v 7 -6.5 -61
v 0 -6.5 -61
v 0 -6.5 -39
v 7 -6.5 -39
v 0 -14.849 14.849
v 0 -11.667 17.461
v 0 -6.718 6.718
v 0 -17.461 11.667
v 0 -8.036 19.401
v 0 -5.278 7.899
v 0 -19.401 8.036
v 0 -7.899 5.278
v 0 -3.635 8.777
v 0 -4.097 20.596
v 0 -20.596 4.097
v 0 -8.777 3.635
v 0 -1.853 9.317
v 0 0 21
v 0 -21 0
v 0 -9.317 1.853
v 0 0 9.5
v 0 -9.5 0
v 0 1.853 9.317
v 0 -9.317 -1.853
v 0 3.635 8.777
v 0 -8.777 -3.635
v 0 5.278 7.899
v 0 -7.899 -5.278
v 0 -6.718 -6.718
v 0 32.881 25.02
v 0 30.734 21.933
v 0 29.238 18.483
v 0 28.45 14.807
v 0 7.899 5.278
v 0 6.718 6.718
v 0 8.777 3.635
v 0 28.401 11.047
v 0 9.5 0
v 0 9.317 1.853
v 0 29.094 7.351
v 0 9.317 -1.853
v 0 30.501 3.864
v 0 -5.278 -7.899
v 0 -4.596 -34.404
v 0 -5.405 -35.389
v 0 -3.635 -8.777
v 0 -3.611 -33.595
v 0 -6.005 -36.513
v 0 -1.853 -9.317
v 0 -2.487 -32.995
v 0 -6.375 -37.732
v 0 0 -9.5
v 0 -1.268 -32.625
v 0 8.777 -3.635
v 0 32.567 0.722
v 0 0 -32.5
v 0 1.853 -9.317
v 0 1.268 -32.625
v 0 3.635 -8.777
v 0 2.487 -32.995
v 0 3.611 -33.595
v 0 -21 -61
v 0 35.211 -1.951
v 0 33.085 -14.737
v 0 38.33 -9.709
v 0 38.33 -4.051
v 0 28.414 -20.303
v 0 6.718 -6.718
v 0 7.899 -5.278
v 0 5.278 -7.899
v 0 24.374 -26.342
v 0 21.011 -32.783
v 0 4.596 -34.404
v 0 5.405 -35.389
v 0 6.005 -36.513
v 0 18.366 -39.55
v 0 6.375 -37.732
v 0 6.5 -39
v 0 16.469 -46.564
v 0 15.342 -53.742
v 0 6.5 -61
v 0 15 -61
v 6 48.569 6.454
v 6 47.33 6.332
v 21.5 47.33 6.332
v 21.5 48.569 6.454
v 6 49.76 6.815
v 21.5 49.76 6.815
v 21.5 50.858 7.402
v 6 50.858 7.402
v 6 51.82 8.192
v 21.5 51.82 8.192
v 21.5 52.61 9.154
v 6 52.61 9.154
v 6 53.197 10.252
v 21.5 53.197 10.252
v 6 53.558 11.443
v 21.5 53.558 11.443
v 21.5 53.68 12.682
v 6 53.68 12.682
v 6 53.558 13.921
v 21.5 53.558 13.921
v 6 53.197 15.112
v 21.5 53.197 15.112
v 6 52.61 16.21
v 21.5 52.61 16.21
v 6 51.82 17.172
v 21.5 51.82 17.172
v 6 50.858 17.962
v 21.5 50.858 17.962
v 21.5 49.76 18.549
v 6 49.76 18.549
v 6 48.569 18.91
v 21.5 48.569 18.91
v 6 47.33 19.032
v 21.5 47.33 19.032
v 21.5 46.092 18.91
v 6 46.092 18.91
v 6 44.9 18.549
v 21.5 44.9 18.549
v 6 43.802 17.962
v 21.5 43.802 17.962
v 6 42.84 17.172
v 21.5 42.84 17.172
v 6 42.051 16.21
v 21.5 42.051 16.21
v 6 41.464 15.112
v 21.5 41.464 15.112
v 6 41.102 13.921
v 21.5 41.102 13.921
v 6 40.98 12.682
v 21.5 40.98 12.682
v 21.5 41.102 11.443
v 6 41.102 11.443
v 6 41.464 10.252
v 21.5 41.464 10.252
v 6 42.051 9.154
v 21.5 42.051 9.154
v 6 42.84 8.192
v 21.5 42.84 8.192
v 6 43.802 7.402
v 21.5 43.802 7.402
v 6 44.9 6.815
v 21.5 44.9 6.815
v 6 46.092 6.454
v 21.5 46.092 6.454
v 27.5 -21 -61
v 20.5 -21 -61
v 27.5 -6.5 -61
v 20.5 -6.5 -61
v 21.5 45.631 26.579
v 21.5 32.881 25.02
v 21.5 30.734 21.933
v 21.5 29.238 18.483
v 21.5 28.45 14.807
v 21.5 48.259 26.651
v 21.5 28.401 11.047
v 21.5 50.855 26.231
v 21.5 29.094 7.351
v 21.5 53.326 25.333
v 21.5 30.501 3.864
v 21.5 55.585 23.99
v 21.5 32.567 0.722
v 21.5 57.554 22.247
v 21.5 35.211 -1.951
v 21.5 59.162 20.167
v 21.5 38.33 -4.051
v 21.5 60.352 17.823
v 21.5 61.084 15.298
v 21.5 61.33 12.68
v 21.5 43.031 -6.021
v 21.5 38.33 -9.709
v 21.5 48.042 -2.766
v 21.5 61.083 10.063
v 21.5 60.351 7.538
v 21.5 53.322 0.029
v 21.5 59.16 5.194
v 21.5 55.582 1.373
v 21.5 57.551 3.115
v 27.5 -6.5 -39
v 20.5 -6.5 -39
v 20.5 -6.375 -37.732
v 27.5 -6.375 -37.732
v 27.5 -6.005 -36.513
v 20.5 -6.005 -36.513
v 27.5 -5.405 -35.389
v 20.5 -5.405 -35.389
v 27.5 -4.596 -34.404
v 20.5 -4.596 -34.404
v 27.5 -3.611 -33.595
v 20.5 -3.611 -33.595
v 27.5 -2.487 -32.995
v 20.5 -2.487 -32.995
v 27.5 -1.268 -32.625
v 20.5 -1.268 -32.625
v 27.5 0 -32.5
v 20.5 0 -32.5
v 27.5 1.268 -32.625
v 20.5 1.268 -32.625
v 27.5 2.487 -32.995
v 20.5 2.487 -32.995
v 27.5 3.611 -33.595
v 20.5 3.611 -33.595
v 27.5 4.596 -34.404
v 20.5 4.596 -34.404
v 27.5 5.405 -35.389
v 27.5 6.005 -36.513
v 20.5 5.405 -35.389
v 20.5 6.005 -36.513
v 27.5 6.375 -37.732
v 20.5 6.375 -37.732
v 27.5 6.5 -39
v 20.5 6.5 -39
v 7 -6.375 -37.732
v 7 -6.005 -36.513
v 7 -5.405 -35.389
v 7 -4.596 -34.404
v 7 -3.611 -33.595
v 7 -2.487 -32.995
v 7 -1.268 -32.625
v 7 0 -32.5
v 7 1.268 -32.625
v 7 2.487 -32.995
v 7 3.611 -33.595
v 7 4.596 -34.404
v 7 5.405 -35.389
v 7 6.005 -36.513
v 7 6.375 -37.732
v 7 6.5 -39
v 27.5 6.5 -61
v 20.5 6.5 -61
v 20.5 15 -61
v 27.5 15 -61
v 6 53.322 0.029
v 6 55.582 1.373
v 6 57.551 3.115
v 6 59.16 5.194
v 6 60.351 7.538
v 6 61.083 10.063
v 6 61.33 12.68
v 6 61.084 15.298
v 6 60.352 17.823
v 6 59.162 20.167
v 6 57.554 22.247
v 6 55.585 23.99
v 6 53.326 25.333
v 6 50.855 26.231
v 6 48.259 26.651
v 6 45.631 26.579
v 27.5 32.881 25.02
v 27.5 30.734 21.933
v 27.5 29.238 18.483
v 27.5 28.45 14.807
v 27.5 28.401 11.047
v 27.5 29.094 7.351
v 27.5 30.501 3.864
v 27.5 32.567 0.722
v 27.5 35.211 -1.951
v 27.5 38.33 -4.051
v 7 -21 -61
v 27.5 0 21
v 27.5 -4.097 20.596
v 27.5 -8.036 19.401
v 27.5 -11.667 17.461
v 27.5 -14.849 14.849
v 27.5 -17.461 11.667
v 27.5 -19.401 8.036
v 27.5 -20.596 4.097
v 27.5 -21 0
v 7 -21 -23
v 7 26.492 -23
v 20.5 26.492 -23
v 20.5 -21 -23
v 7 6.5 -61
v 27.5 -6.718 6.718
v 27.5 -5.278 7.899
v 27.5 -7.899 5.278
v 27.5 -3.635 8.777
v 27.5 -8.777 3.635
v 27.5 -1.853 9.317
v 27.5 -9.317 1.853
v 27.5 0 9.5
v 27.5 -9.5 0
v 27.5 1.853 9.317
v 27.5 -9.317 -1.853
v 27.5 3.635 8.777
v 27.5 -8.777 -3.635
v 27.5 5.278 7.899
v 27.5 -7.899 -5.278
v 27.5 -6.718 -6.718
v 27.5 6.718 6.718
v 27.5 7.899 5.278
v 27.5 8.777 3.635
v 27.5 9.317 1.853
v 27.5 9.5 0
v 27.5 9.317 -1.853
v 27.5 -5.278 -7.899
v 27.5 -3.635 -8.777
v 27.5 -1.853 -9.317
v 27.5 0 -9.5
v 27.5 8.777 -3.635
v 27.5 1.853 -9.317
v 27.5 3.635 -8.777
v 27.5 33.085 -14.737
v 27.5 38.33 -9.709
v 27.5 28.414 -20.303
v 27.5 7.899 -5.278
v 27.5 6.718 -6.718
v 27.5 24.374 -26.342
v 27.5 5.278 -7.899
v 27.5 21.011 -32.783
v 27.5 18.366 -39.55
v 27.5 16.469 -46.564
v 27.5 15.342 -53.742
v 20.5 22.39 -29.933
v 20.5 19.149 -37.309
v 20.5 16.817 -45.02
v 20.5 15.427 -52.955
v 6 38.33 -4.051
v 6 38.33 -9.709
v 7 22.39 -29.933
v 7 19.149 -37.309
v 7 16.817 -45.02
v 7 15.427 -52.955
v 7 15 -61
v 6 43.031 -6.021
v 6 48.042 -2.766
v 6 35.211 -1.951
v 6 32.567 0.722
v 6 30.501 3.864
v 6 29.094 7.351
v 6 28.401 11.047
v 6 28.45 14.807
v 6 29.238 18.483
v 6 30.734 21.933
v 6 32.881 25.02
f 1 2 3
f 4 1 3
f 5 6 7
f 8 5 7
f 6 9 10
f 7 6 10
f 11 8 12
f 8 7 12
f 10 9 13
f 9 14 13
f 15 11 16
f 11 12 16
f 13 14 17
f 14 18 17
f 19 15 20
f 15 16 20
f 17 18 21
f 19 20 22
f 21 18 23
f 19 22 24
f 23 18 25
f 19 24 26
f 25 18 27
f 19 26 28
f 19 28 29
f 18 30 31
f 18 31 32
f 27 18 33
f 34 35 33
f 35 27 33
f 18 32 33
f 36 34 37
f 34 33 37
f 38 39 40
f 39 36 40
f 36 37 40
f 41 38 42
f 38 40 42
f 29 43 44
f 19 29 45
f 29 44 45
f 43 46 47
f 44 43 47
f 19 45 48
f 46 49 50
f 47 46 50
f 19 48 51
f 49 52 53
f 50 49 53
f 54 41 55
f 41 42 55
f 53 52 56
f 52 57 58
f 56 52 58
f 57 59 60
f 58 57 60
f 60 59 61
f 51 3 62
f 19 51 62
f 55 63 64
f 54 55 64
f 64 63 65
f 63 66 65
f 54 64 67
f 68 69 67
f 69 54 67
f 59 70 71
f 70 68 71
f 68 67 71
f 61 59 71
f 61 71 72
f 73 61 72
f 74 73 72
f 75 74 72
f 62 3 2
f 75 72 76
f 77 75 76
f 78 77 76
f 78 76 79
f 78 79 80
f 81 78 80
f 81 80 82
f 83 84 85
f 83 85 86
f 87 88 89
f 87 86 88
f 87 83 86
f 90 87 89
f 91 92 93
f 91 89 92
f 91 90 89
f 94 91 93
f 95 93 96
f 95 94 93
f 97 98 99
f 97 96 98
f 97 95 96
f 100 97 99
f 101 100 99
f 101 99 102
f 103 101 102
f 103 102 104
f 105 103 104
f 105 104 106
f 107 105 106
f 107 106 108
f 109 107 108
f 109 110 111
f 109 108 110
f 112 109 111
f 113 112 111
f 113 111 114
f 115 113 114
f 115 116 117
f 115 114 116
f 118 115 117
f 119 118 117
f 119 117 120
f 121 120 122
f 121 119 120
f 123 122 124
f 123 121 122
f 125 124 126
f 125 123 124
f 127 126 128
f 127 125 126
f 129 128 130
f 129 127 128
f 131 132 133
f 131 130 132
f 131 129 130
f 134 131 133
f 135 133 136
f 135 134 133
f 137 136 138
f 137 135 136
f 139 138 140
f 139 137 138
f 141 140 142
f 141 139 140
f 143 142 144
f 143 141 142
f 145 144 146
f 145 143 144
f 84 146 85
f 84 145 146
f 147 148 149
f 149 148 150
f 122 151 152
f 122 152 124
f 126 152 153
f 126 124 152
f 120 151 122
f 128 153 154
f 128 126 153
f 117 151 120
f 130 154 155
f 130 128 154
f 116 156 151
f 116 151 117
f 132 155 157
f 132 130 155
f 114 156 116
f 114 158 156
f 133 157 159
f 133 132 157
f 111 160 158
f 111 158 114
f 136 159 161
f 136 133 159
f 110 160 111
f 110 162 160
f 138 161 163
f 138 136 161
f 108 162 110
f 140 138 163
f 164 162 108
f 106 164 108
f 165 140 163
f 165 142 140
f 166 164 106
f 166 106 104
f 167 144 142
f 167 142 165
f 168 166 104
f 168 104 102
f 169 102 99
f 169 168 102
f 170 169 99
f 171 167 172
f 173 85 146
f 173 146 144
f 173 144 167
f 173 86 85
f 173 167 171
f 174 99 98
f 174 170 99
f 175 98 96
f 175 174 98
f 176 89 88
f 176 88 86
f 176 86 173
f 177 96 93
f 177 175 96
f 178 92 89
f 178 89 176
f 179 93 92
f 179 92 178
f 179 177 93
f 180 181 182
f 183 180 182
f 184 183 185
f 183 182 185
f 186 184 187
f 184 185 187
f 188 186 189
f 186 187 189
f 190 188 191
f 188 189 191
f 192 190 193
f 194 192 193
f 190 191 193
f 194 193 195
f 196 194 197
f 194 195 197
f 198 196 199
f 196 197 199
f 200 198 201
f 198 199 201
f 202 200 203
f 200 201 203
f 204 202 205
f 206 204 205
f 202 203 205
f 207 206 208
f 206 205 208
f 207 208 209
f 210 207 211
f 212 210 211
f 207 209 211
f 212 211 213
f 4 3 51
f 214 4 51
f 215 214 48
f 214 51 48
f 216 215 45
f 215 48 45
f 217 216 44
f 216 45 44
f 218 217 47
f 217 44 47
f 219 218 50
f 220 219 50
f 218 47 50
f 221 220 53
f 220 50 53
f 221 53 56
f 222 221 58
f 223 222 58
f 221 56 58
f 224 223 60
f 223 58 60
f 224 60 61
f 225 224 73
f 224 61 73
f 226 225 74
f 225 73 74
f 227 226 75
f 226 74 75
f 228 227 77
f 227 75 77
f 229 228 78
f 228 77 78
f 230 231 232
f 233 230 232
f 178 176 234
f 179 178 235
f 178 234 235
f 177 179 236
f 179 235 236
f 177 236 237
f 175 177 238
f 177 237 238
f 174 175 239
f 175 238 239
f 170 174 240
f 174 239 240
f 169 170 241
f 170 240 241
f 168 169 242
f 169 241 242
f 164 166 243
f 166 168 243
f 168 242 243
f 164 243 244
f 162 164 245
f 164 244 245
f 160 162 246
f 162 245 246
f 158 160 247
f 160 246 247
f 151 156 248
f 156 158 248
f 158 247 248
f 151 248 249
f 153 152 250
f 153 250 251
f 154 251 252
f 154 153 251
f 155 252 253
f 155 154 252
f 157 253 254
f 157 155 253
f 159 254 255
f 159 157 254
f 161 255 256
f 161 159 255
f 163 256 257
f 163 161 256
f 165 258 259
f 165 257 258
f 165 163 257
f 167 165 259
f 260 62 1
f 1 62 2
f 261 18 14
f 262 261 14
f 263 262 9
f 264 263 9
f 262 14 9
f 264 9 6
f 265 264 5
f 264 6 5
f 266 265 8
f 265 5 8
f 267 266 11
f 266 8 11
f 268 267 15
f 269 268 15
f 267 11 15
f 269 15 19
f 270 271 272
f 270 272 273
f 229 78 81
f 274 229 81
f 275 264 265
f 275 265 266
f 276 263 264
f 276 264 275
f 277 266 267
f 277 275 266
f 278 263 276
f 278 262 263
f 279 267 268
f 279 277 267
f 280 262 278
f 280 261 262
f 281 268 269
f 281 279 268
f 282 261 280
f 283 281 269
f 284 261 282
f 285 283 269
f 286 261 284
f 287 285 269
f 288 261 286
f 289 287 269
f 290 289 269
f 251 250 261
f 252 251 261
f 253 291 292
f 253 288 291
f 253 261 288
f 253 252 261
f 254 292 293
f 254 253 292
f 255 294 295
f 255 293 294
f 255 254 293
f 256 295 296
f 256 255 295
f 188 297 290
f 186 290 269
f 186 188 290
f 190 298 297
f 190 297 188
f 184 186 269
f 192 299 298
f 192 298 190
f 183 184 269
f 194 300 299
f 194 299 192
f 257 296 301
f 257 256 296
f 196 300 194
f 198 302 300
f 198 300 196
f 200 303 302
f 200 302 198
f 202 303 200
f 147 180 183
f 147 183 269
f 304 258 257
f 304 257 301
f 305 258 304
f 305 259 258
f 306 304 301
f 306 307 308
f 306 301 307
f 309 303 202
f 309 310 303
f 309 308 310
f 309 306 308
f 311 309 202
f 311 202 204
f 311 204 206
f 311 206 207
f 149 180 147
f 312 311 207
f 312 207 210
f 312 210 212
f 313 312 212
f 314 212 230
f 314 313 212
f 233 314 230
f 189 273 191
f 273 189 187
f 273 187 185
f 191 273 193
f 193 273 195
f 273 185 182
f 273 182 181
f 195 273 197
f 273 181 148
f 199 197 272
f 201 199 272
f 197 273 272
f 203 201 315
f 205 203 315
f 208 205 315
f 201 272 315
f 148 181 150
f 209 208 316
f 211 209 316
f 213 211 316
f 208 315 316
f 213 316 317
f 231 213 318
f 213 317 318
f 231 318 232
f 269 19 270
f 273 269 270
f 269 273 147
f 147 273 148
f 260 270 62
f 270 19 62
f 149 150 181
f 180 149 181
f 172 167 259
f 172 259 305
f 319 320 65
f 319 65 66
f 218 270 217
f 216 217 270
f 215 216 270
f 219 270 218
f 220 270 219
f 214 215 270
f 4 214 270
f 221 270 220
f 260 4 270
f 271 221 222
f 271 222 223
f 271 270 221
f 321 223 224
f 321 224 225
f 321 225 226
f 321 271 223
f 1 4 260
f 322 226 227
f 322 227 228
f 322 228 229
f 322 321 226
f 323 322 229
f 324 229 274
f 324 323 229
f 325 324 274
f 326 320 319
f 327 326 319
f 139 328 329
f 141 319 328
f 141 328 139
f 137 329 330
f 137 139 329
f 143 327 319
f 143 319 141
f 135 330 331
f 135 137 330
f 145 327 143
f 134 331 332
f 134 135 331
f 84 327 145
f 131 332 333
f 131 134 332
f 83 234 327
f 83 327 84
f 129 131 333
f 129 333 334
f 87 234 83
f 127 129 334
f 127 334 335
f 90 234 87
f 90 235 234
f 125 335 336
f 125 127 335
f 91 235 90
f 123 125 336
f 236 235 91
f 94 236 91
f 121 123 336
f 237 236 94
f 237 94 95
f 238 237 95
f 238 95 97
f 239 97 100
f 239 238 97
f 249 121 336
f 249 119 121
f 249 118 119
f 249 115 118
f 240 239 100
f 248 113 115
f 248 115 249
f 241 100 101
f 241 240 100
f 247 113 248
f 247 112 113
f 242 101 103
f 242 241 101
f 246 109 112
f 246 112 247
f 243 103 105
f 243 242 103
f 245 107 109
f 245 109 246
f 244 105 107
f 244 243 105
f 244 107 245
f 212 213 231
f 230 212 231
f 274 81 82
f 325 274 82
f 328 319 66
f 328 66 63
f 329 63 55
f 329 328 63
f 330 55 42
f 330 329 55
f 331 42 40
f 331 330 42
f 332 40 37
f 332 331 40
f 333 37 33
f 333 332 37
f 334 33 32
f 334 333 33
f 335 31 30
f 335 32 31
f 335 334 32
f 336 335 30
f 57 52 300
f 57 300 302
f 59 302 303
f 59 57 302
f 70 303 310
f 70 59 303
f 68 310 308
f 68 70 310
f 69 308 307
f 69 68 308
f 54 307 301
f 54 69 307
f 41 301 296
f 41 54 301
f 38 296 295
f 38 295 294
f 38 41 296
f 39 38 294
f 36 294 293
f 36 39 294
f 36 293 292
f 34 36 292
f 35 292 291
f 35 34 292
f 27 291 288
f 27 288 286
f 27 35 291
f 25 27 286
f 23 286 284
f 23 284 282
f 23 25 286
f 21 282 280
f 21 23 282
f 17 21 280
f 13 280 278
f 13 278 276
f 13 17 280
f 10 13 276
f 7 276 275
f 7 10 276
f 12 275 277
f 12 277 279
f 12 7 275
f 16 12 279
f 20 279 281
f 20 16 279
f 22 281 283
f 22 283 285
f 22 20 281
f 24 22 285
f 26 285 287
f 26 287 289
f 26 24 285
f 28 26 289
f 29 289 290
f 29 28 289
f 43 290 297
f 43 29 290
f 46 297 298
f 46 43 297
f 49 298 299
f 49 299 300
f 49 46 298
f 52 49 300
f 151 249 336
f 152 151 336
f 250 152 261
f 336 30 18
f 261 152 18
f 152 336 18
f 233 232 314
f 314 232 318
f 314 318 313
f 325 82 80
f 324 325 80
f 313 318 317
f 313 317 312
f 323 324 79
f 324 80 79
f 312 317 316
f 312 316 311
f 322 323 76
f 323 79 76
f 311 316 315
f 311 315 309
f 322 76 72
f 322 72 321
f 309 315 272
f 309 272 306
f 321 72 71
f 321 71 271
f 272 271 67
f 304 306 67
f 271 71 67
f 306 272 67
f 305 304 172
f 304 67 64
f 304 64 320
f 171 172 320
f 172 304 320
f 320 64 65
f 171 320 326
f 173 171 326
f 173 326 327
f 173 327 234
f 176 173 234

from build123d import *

# Parameters (mm, degrees)
SKETCH1_R               = 9.5
SKETCH1_R_2             = 6.35
BOSS_EXTRUDE1_DEPTH     = 27.5
CUT_EXTRUDE2_DEPTH      = 91.767085063
CUT_EXTRUDE2_DEPTH_BACK = 6
CUT_EXTRUDE3_DEPTH      = 91.767085063
CUT_EXTRUDE3_DEPTH_BACK = 6
CUT_EXTRUDE5_DEPTH      = 6.75
CUT_EXTRUDE5_DEPTH_BACK = 6.75


with BuildPart() as part:
    # Sketch1 → Boss-Extrude1 (new body)
    with BuildSketch(Plane(origin=(0, 0, 0), x_dir=(0, 0, -1), z_dir=(1, 0, 0))):
        with BuildLine():
            Line((39, 6.5), (61, 6.5))
            Line((61, 6.5), (61, 15))
            ThreePointArc((61, 15), (24.894386745, 25.257382556), (-0.029226303, 53.322355709))
            ThreePointArc((-0.029226303, 53.322355709), (-16.577537576, 60.777514808), (-26.578667772, 45.631446077))
            Line((-26.578667772, 45.631446077), (-21, 0))
            ThreePointArc((-21, 0), (-14.849242405, -14.849242405), (0, -21))
            Line((0, -21), (61, -21))
            Line((61, -21), (61, -6.5))
            Line((61, -6.5), (39, -6.5))
            ThreePointArc((39, -6.5), (32.5, 0), (39, 6.5))
        make_face()
        Circle(SKETCH1_R, mode=Mode.SUBTRACT)
        with Locations((-12.68213321, 47.330365488)):
            Circle(SKETCH1_R_2, mode=Mode.SUBTRACT)
    extrude(amount=BOSS_EXTRUDE1_DEPTH)

    # Sketch4 → Cut-Extrude2 (cut, two sides: drawn at the far end of the back side and taken through both)
    with BuildSketch(Plane.ZY.offset(-CUT_EXTRUDE2_DEPTH_BACK)):
        with BuildLine():
            Line((-222.712922977, 38.330365488), (-9.709497533, 38.330365488))
            Line((-9.709497533, 38.330365488), (-4.051067321, 38.330365488))
            ThreePointArc((-4.051067321, 38.330365488), (9.181632836, 28.655609877), (25.019880988, 32.881144756))
            Line((25.019880988, 32.881144756), (187.005855245, 171.196015234))
            Line((187.005855245, 171.196015234), (55.595163053, 576.428130178))
            Line((55.595163053, 576.428130178), (-354.123615169, 443.562480432))
            Line((-354.123615169, 443.562480432), (-222.712922977, 38.330365488))
        make_face()
    extrude(amount=CUT_EXTRUDE2_DEPTH + CUT_EXTRUDE2_DEPTH_BACK, mode=Mode.SUBTRACT)

    # Sketch6 → Cut-Extrude3 (cut, two sides: drawn at the far end of the back side and taken through both)
    with BuildSketch(Plane(origin=(27.5, 0, 0), x_dir=(0, 0, -1), z_dir=(1, 0, 0)).offset(-CUT_EXTRUDE3_DEPTH_BACK)):
        with BuildLine():
            Line((-187.005855245, 171.196015234), (-25.019880988, 32.881144756))
            ThreePointArc((-25.019880988, 32.881144756), (-9.181632836, 28.655609877), (4.051067321, 38.330365488))
            Line((4.051067321, 38.330365488), (9.709497533, 38.330365488))
            Line((9.709497533, 38.330365488), (222.712922977, 38.330365488))
            Line((222.712922977, 38.330365488), (354.123615169, 443.562480432))
            Line((354.123615169, 443.562480432), (-55.595163053, 576.428130178))
            Line((-55.595163053, 576.428130178), (-187.005855245, 171.196015234))
        make_face()
    extrude(amount=CUT_EXTRUDE3_DEPTH + CUT_EXTRUDE3_DEPTH_BACK, mode=Mode.SUBTRACT)

    # Sketch12 → Cut-Extrude5 (cut, two sides: drawn at the far end of the back side and taken through both)
    with BuildSketch(Plane(origin=(13.75, 0, 0), x_dir=(0, 0, -1), z_dir=(1, 0, 0)).offset(-CUT_EXTRUDE5_DEPTH_BACK)):
        with BuildLine():
            ThreePointArc((61, 15), (41.129282246, 17.866834211), (23, 26.491988568))
            Line((23, 26.491988568), (23, -21))
            Line((23, -21), (61, -21))
            Line((61, -21), (61, -6.5))
            Line((61, -6.5), (39, -6.5))
            ThreePointArc((39, -6.5), (32.5, 0), (39, 6.5))
            Line((39, 6.5), (61, 6.5))
            Line((61, 6.5), (61, 15))
        make_face()
    extrude(amount=CUT_EXTRUDE5_DEPTH + CUT_EXTRUDE5_DEPTH_BACK, mode=Mode.SUBTRACT)


solid = part.part
